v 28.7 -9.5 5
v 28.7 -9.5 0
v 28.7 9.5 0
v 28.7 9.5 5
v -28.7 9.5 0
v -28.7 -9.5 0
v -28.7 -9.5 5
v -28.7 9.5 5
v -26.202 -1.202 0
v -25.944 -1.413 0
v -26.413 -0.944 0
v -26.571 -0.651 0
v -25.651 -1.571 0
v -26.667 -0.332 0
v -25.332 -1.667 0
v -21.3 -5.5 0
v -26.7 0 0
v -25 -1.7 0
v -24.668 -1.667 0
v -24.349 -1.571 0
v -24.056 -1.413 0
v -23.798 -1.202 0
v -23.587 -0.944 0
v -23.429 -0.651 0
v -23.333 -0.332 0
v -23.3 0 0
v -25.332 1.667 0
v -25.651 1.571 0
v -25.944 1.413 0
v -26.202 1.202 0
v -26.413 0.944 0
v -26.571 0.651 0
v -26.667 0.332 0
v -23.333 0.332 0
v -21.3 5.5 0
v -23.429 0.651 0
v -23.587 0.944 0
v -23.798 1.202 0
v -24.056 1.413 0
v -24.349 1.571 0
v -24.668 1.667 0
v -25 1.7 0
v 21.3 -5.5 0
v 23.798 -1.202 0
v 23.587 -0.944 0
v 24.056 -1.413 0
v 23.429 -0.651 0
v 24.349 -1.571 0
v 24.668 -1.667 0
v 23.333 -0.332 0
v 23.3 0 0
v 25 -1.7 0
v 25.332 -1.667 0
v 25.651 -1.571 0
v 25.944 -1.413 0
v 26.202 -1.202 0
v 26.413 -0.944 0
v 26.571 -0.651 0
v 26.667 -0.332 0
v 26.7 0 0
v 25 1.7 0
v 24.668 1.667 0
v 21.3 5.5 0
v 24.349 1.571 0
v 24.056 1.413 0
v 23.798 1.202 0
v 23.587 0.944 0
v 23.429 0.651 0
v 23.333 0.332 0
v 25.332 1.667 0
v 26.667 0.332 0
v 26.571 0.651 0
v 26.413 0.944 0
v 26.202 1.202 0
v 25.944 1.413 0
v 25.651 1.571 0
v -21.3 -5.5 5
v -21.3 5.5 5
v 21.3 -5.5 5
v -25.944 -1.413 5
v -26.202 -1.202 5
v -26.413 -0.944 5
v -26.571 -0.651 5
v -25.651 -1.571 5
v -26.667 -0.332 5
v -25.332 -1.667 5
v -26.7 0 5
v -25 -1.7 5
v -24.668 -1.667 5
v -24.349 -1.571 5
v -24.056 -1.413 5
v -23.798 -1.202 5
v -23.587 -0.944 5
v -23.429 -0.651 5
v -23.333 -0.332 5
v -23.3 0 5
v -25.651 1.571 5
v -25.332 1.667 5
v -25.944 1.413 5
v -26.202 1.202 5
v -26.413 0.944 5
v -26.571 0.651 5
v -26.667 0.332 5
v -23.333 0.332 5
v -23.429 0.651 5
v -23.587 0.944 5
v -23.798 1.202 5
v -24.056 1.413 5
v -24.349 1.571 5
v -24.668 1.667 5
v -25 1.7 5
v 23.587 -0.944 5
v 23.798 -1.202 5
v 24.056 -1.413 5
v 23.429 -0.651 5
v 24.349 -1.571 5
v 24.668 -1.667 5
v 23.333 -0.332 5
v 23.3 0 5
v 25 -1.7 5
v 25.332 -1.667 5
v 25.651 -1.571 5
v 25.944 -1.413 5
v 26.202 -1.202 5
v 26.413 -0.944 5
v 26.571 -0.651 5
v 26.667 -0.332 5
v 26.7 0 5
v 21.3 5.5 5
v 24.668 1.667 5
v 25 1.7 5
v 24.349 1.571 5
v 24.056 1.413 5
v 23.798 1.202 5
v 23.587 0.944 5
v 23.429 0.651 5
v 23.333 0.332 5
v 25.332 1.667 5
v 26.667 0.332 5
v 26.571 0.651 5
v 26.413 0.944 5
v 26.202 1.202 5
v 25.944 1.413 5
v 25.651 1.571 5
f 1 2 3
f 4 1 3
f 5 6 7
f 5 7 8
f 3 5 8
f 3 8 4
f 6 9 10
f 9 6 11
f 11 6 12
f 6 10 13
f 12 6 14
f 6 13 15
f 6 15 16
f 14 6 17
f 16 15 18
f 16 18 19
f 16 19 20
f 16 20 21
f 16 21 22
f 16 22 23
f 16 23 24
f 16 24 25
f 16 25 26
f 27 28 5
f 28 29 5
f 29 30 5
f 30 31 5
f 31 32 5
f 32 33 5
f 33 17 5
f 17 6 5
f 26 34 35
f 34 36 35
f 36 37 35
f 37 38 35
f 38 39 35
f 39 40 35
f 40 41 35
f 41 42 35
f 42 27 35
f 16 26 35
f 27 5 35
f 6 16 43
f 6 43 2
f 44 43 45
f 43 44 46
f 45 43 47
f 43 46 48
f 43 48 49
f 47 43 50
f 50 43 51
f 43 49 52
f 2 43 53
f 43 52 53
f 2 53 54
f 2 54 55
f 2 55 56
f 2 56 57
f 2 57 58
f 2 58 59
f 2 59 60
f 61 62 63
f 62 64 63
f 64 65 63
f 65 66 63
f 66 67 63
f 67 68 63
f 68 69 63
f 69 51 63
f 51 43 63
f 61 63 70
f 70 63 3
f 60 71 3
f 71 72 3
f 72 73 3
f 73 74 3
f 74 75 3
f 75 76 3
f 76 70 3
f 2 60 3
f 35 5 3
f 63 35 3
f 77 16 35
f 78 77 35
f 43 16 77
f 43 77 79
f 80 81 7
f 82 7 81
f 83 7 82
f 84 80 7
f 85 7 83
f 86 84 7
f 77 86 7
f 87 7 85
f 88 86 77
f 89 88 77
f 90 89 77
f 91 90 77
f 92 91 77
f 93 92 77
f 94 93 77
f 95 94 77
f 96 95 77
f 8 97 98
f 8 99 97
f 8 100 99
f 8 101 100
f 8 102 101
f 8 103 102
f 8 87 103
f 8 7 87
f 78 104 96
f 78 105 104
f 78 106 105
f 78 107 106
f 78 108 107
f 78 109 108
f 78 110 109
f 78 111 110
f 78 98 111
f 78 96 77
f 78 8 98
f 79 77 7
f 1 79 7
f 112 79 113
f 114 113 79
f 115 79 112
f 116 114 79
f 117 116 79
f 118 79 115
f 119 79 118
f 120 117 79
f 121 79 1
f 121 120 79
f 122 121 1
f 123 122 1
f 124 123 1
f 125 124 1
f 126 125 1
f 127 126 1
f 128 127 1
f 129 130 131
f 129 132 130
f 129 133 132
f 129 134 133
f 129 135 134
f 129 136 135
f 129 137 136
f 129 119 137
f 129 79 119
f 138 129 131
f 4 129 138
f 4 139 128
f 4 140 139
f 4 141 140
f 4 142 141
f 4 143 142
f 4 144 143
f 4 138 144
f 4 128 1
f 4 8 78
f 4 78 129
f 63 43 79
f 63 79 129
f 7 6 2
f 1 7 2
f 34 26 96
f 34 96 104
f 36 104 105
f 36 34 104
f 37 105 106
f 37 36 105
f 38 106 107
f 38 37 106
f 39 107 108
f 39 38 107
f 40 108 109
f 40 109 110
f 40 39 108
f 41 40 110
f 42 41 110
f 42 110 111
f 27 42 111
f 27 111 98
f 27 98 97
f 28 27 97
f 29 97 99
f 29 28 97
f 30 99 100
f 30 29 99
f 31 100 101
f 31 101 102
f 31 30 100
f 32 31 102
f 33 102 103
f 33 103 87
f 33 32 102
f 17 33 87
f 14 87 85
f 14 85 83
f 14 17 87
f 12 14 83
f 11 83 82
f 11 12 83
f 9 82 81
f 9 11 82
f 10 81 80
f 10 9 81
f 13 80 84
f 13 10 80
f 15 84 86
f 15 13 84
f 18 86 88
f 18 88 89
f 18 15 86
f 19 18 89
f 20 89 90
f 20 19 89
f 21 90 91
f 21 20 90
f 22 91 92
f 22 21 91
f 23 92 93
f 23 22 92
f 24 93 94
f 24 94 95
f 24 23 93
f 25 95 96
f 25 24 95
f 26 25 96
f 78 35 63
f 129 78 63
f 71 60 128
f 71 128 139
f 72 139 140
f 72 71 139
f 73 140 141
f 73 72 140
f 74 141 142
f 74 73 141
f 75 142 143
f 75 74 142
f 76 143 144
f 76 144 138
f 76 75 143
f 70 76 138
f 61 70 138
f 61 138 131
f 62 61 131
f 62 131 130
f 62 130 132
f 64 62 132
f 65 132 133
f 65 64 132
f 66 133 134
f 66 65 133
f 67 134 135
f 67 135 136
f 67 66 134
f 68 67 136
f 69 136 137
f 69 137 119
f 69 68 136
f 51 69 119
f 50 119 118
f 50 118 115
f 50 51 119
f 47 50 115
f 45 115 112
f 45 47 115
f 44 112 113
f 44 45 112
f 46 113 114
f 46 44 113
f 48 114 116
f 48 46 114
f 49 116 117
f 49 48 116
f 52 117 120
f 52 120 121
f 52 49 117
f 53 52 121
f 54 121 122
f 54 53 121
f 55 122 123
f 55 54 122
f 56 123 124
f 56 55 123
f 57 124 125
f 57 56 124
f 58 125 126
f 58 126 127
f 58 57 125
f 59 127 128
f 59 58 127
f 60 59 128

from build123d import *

# Parameters (mm, degrees)
SKETCH_W   = 57.4
SKETCH_H   = 19
SKETCH_R   = 1.7
SKETCH_W_2 = 42.6
SKETCH_H_2 = 11
PAD_DEPTH  = 5


with BuildPart() as part:
    # Sketch → Pad (new body)
    with BuildSketch(Plane.XY):
        Rectangle(SKETCH_W, SKETCH_H)
        with Locations((-25, 0)):
            Circle(SKETCH_R, mode=Mode.SUBTRACT)
        with Locations((25, 0)):
            Circle(SKETCH_R, mode=Mode.SUBTRACT)
        Rectangle(SKETCH_W_2, SKETCH_H_2, mode=Mode.SUBTRACT)
    extrude(amount=PAD_DEPTH)


solid = part.part
